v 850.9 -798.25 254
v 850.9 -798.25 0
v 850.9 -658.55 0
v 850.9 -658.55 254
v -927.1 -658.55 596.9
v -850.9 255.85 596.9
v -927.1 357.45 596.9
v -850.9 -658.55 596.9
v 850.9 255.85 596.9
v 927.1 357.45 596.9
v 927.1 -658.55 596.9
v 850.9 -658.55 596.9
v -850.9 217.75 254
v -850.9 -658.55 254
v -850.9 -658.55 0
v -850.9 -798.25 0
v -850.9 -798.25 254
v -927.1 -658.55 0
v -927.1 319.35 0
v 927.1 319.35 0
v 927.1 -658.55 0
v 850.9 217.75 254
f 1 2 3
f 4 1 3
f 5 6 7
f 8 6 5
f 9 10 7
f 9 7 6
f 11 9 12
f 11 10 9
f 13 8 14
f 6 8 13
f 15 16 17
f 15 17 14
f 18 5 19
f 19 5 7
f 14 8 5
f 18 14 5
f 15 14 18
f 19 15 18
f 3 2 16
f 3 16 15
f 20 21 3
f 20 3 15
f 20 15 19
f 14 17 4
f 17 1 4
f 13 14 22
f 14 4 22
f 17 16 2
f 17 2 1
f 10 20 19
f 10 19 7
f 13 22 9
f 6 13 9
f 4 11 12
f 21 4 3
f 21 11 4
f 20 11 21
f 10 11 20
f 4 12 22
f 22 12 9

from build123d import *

# Parameters (mm, degrees)
F1_DEPTH = 927.1
F3_DEPTH = 850.9
F4_W     = 139.7
F4_H     = 254
F5_DEPTH = 850.9


with BuildPart() as f1:
    # F0 (on Right) → F1 (new body, symmetric)
    with BuildSketch(Plane.YZ):
        Polygon((-658.550496, 596.9), (-658.550496, 0), (319.349504, 0), (357.449504, 596.9), align=None)
    extrude(amount=F1_DEPTH, both=True)

    # F2 (on Right) → F3 (cut, symmetric)
    with BuildSketch(Plane.YZ):
        Polygon((-658.550496, 596.9), (-658.550496, 254), (217.749504, 254), (255.849504, 596.9), align=None)
    extrude(amount=F3_DEPTH, both=True, mode=Mode.SUBTRACT)

    # F4 (on Right) → F5 (join, symmetric)
    with BuildSketch(Plane.YZ):
        with Locations((-728.400496, 127)):
            Rectangle(F4_W, F4_H)
    extrude(amount=F5_DEPTH, both=True)


solid = f1.part
